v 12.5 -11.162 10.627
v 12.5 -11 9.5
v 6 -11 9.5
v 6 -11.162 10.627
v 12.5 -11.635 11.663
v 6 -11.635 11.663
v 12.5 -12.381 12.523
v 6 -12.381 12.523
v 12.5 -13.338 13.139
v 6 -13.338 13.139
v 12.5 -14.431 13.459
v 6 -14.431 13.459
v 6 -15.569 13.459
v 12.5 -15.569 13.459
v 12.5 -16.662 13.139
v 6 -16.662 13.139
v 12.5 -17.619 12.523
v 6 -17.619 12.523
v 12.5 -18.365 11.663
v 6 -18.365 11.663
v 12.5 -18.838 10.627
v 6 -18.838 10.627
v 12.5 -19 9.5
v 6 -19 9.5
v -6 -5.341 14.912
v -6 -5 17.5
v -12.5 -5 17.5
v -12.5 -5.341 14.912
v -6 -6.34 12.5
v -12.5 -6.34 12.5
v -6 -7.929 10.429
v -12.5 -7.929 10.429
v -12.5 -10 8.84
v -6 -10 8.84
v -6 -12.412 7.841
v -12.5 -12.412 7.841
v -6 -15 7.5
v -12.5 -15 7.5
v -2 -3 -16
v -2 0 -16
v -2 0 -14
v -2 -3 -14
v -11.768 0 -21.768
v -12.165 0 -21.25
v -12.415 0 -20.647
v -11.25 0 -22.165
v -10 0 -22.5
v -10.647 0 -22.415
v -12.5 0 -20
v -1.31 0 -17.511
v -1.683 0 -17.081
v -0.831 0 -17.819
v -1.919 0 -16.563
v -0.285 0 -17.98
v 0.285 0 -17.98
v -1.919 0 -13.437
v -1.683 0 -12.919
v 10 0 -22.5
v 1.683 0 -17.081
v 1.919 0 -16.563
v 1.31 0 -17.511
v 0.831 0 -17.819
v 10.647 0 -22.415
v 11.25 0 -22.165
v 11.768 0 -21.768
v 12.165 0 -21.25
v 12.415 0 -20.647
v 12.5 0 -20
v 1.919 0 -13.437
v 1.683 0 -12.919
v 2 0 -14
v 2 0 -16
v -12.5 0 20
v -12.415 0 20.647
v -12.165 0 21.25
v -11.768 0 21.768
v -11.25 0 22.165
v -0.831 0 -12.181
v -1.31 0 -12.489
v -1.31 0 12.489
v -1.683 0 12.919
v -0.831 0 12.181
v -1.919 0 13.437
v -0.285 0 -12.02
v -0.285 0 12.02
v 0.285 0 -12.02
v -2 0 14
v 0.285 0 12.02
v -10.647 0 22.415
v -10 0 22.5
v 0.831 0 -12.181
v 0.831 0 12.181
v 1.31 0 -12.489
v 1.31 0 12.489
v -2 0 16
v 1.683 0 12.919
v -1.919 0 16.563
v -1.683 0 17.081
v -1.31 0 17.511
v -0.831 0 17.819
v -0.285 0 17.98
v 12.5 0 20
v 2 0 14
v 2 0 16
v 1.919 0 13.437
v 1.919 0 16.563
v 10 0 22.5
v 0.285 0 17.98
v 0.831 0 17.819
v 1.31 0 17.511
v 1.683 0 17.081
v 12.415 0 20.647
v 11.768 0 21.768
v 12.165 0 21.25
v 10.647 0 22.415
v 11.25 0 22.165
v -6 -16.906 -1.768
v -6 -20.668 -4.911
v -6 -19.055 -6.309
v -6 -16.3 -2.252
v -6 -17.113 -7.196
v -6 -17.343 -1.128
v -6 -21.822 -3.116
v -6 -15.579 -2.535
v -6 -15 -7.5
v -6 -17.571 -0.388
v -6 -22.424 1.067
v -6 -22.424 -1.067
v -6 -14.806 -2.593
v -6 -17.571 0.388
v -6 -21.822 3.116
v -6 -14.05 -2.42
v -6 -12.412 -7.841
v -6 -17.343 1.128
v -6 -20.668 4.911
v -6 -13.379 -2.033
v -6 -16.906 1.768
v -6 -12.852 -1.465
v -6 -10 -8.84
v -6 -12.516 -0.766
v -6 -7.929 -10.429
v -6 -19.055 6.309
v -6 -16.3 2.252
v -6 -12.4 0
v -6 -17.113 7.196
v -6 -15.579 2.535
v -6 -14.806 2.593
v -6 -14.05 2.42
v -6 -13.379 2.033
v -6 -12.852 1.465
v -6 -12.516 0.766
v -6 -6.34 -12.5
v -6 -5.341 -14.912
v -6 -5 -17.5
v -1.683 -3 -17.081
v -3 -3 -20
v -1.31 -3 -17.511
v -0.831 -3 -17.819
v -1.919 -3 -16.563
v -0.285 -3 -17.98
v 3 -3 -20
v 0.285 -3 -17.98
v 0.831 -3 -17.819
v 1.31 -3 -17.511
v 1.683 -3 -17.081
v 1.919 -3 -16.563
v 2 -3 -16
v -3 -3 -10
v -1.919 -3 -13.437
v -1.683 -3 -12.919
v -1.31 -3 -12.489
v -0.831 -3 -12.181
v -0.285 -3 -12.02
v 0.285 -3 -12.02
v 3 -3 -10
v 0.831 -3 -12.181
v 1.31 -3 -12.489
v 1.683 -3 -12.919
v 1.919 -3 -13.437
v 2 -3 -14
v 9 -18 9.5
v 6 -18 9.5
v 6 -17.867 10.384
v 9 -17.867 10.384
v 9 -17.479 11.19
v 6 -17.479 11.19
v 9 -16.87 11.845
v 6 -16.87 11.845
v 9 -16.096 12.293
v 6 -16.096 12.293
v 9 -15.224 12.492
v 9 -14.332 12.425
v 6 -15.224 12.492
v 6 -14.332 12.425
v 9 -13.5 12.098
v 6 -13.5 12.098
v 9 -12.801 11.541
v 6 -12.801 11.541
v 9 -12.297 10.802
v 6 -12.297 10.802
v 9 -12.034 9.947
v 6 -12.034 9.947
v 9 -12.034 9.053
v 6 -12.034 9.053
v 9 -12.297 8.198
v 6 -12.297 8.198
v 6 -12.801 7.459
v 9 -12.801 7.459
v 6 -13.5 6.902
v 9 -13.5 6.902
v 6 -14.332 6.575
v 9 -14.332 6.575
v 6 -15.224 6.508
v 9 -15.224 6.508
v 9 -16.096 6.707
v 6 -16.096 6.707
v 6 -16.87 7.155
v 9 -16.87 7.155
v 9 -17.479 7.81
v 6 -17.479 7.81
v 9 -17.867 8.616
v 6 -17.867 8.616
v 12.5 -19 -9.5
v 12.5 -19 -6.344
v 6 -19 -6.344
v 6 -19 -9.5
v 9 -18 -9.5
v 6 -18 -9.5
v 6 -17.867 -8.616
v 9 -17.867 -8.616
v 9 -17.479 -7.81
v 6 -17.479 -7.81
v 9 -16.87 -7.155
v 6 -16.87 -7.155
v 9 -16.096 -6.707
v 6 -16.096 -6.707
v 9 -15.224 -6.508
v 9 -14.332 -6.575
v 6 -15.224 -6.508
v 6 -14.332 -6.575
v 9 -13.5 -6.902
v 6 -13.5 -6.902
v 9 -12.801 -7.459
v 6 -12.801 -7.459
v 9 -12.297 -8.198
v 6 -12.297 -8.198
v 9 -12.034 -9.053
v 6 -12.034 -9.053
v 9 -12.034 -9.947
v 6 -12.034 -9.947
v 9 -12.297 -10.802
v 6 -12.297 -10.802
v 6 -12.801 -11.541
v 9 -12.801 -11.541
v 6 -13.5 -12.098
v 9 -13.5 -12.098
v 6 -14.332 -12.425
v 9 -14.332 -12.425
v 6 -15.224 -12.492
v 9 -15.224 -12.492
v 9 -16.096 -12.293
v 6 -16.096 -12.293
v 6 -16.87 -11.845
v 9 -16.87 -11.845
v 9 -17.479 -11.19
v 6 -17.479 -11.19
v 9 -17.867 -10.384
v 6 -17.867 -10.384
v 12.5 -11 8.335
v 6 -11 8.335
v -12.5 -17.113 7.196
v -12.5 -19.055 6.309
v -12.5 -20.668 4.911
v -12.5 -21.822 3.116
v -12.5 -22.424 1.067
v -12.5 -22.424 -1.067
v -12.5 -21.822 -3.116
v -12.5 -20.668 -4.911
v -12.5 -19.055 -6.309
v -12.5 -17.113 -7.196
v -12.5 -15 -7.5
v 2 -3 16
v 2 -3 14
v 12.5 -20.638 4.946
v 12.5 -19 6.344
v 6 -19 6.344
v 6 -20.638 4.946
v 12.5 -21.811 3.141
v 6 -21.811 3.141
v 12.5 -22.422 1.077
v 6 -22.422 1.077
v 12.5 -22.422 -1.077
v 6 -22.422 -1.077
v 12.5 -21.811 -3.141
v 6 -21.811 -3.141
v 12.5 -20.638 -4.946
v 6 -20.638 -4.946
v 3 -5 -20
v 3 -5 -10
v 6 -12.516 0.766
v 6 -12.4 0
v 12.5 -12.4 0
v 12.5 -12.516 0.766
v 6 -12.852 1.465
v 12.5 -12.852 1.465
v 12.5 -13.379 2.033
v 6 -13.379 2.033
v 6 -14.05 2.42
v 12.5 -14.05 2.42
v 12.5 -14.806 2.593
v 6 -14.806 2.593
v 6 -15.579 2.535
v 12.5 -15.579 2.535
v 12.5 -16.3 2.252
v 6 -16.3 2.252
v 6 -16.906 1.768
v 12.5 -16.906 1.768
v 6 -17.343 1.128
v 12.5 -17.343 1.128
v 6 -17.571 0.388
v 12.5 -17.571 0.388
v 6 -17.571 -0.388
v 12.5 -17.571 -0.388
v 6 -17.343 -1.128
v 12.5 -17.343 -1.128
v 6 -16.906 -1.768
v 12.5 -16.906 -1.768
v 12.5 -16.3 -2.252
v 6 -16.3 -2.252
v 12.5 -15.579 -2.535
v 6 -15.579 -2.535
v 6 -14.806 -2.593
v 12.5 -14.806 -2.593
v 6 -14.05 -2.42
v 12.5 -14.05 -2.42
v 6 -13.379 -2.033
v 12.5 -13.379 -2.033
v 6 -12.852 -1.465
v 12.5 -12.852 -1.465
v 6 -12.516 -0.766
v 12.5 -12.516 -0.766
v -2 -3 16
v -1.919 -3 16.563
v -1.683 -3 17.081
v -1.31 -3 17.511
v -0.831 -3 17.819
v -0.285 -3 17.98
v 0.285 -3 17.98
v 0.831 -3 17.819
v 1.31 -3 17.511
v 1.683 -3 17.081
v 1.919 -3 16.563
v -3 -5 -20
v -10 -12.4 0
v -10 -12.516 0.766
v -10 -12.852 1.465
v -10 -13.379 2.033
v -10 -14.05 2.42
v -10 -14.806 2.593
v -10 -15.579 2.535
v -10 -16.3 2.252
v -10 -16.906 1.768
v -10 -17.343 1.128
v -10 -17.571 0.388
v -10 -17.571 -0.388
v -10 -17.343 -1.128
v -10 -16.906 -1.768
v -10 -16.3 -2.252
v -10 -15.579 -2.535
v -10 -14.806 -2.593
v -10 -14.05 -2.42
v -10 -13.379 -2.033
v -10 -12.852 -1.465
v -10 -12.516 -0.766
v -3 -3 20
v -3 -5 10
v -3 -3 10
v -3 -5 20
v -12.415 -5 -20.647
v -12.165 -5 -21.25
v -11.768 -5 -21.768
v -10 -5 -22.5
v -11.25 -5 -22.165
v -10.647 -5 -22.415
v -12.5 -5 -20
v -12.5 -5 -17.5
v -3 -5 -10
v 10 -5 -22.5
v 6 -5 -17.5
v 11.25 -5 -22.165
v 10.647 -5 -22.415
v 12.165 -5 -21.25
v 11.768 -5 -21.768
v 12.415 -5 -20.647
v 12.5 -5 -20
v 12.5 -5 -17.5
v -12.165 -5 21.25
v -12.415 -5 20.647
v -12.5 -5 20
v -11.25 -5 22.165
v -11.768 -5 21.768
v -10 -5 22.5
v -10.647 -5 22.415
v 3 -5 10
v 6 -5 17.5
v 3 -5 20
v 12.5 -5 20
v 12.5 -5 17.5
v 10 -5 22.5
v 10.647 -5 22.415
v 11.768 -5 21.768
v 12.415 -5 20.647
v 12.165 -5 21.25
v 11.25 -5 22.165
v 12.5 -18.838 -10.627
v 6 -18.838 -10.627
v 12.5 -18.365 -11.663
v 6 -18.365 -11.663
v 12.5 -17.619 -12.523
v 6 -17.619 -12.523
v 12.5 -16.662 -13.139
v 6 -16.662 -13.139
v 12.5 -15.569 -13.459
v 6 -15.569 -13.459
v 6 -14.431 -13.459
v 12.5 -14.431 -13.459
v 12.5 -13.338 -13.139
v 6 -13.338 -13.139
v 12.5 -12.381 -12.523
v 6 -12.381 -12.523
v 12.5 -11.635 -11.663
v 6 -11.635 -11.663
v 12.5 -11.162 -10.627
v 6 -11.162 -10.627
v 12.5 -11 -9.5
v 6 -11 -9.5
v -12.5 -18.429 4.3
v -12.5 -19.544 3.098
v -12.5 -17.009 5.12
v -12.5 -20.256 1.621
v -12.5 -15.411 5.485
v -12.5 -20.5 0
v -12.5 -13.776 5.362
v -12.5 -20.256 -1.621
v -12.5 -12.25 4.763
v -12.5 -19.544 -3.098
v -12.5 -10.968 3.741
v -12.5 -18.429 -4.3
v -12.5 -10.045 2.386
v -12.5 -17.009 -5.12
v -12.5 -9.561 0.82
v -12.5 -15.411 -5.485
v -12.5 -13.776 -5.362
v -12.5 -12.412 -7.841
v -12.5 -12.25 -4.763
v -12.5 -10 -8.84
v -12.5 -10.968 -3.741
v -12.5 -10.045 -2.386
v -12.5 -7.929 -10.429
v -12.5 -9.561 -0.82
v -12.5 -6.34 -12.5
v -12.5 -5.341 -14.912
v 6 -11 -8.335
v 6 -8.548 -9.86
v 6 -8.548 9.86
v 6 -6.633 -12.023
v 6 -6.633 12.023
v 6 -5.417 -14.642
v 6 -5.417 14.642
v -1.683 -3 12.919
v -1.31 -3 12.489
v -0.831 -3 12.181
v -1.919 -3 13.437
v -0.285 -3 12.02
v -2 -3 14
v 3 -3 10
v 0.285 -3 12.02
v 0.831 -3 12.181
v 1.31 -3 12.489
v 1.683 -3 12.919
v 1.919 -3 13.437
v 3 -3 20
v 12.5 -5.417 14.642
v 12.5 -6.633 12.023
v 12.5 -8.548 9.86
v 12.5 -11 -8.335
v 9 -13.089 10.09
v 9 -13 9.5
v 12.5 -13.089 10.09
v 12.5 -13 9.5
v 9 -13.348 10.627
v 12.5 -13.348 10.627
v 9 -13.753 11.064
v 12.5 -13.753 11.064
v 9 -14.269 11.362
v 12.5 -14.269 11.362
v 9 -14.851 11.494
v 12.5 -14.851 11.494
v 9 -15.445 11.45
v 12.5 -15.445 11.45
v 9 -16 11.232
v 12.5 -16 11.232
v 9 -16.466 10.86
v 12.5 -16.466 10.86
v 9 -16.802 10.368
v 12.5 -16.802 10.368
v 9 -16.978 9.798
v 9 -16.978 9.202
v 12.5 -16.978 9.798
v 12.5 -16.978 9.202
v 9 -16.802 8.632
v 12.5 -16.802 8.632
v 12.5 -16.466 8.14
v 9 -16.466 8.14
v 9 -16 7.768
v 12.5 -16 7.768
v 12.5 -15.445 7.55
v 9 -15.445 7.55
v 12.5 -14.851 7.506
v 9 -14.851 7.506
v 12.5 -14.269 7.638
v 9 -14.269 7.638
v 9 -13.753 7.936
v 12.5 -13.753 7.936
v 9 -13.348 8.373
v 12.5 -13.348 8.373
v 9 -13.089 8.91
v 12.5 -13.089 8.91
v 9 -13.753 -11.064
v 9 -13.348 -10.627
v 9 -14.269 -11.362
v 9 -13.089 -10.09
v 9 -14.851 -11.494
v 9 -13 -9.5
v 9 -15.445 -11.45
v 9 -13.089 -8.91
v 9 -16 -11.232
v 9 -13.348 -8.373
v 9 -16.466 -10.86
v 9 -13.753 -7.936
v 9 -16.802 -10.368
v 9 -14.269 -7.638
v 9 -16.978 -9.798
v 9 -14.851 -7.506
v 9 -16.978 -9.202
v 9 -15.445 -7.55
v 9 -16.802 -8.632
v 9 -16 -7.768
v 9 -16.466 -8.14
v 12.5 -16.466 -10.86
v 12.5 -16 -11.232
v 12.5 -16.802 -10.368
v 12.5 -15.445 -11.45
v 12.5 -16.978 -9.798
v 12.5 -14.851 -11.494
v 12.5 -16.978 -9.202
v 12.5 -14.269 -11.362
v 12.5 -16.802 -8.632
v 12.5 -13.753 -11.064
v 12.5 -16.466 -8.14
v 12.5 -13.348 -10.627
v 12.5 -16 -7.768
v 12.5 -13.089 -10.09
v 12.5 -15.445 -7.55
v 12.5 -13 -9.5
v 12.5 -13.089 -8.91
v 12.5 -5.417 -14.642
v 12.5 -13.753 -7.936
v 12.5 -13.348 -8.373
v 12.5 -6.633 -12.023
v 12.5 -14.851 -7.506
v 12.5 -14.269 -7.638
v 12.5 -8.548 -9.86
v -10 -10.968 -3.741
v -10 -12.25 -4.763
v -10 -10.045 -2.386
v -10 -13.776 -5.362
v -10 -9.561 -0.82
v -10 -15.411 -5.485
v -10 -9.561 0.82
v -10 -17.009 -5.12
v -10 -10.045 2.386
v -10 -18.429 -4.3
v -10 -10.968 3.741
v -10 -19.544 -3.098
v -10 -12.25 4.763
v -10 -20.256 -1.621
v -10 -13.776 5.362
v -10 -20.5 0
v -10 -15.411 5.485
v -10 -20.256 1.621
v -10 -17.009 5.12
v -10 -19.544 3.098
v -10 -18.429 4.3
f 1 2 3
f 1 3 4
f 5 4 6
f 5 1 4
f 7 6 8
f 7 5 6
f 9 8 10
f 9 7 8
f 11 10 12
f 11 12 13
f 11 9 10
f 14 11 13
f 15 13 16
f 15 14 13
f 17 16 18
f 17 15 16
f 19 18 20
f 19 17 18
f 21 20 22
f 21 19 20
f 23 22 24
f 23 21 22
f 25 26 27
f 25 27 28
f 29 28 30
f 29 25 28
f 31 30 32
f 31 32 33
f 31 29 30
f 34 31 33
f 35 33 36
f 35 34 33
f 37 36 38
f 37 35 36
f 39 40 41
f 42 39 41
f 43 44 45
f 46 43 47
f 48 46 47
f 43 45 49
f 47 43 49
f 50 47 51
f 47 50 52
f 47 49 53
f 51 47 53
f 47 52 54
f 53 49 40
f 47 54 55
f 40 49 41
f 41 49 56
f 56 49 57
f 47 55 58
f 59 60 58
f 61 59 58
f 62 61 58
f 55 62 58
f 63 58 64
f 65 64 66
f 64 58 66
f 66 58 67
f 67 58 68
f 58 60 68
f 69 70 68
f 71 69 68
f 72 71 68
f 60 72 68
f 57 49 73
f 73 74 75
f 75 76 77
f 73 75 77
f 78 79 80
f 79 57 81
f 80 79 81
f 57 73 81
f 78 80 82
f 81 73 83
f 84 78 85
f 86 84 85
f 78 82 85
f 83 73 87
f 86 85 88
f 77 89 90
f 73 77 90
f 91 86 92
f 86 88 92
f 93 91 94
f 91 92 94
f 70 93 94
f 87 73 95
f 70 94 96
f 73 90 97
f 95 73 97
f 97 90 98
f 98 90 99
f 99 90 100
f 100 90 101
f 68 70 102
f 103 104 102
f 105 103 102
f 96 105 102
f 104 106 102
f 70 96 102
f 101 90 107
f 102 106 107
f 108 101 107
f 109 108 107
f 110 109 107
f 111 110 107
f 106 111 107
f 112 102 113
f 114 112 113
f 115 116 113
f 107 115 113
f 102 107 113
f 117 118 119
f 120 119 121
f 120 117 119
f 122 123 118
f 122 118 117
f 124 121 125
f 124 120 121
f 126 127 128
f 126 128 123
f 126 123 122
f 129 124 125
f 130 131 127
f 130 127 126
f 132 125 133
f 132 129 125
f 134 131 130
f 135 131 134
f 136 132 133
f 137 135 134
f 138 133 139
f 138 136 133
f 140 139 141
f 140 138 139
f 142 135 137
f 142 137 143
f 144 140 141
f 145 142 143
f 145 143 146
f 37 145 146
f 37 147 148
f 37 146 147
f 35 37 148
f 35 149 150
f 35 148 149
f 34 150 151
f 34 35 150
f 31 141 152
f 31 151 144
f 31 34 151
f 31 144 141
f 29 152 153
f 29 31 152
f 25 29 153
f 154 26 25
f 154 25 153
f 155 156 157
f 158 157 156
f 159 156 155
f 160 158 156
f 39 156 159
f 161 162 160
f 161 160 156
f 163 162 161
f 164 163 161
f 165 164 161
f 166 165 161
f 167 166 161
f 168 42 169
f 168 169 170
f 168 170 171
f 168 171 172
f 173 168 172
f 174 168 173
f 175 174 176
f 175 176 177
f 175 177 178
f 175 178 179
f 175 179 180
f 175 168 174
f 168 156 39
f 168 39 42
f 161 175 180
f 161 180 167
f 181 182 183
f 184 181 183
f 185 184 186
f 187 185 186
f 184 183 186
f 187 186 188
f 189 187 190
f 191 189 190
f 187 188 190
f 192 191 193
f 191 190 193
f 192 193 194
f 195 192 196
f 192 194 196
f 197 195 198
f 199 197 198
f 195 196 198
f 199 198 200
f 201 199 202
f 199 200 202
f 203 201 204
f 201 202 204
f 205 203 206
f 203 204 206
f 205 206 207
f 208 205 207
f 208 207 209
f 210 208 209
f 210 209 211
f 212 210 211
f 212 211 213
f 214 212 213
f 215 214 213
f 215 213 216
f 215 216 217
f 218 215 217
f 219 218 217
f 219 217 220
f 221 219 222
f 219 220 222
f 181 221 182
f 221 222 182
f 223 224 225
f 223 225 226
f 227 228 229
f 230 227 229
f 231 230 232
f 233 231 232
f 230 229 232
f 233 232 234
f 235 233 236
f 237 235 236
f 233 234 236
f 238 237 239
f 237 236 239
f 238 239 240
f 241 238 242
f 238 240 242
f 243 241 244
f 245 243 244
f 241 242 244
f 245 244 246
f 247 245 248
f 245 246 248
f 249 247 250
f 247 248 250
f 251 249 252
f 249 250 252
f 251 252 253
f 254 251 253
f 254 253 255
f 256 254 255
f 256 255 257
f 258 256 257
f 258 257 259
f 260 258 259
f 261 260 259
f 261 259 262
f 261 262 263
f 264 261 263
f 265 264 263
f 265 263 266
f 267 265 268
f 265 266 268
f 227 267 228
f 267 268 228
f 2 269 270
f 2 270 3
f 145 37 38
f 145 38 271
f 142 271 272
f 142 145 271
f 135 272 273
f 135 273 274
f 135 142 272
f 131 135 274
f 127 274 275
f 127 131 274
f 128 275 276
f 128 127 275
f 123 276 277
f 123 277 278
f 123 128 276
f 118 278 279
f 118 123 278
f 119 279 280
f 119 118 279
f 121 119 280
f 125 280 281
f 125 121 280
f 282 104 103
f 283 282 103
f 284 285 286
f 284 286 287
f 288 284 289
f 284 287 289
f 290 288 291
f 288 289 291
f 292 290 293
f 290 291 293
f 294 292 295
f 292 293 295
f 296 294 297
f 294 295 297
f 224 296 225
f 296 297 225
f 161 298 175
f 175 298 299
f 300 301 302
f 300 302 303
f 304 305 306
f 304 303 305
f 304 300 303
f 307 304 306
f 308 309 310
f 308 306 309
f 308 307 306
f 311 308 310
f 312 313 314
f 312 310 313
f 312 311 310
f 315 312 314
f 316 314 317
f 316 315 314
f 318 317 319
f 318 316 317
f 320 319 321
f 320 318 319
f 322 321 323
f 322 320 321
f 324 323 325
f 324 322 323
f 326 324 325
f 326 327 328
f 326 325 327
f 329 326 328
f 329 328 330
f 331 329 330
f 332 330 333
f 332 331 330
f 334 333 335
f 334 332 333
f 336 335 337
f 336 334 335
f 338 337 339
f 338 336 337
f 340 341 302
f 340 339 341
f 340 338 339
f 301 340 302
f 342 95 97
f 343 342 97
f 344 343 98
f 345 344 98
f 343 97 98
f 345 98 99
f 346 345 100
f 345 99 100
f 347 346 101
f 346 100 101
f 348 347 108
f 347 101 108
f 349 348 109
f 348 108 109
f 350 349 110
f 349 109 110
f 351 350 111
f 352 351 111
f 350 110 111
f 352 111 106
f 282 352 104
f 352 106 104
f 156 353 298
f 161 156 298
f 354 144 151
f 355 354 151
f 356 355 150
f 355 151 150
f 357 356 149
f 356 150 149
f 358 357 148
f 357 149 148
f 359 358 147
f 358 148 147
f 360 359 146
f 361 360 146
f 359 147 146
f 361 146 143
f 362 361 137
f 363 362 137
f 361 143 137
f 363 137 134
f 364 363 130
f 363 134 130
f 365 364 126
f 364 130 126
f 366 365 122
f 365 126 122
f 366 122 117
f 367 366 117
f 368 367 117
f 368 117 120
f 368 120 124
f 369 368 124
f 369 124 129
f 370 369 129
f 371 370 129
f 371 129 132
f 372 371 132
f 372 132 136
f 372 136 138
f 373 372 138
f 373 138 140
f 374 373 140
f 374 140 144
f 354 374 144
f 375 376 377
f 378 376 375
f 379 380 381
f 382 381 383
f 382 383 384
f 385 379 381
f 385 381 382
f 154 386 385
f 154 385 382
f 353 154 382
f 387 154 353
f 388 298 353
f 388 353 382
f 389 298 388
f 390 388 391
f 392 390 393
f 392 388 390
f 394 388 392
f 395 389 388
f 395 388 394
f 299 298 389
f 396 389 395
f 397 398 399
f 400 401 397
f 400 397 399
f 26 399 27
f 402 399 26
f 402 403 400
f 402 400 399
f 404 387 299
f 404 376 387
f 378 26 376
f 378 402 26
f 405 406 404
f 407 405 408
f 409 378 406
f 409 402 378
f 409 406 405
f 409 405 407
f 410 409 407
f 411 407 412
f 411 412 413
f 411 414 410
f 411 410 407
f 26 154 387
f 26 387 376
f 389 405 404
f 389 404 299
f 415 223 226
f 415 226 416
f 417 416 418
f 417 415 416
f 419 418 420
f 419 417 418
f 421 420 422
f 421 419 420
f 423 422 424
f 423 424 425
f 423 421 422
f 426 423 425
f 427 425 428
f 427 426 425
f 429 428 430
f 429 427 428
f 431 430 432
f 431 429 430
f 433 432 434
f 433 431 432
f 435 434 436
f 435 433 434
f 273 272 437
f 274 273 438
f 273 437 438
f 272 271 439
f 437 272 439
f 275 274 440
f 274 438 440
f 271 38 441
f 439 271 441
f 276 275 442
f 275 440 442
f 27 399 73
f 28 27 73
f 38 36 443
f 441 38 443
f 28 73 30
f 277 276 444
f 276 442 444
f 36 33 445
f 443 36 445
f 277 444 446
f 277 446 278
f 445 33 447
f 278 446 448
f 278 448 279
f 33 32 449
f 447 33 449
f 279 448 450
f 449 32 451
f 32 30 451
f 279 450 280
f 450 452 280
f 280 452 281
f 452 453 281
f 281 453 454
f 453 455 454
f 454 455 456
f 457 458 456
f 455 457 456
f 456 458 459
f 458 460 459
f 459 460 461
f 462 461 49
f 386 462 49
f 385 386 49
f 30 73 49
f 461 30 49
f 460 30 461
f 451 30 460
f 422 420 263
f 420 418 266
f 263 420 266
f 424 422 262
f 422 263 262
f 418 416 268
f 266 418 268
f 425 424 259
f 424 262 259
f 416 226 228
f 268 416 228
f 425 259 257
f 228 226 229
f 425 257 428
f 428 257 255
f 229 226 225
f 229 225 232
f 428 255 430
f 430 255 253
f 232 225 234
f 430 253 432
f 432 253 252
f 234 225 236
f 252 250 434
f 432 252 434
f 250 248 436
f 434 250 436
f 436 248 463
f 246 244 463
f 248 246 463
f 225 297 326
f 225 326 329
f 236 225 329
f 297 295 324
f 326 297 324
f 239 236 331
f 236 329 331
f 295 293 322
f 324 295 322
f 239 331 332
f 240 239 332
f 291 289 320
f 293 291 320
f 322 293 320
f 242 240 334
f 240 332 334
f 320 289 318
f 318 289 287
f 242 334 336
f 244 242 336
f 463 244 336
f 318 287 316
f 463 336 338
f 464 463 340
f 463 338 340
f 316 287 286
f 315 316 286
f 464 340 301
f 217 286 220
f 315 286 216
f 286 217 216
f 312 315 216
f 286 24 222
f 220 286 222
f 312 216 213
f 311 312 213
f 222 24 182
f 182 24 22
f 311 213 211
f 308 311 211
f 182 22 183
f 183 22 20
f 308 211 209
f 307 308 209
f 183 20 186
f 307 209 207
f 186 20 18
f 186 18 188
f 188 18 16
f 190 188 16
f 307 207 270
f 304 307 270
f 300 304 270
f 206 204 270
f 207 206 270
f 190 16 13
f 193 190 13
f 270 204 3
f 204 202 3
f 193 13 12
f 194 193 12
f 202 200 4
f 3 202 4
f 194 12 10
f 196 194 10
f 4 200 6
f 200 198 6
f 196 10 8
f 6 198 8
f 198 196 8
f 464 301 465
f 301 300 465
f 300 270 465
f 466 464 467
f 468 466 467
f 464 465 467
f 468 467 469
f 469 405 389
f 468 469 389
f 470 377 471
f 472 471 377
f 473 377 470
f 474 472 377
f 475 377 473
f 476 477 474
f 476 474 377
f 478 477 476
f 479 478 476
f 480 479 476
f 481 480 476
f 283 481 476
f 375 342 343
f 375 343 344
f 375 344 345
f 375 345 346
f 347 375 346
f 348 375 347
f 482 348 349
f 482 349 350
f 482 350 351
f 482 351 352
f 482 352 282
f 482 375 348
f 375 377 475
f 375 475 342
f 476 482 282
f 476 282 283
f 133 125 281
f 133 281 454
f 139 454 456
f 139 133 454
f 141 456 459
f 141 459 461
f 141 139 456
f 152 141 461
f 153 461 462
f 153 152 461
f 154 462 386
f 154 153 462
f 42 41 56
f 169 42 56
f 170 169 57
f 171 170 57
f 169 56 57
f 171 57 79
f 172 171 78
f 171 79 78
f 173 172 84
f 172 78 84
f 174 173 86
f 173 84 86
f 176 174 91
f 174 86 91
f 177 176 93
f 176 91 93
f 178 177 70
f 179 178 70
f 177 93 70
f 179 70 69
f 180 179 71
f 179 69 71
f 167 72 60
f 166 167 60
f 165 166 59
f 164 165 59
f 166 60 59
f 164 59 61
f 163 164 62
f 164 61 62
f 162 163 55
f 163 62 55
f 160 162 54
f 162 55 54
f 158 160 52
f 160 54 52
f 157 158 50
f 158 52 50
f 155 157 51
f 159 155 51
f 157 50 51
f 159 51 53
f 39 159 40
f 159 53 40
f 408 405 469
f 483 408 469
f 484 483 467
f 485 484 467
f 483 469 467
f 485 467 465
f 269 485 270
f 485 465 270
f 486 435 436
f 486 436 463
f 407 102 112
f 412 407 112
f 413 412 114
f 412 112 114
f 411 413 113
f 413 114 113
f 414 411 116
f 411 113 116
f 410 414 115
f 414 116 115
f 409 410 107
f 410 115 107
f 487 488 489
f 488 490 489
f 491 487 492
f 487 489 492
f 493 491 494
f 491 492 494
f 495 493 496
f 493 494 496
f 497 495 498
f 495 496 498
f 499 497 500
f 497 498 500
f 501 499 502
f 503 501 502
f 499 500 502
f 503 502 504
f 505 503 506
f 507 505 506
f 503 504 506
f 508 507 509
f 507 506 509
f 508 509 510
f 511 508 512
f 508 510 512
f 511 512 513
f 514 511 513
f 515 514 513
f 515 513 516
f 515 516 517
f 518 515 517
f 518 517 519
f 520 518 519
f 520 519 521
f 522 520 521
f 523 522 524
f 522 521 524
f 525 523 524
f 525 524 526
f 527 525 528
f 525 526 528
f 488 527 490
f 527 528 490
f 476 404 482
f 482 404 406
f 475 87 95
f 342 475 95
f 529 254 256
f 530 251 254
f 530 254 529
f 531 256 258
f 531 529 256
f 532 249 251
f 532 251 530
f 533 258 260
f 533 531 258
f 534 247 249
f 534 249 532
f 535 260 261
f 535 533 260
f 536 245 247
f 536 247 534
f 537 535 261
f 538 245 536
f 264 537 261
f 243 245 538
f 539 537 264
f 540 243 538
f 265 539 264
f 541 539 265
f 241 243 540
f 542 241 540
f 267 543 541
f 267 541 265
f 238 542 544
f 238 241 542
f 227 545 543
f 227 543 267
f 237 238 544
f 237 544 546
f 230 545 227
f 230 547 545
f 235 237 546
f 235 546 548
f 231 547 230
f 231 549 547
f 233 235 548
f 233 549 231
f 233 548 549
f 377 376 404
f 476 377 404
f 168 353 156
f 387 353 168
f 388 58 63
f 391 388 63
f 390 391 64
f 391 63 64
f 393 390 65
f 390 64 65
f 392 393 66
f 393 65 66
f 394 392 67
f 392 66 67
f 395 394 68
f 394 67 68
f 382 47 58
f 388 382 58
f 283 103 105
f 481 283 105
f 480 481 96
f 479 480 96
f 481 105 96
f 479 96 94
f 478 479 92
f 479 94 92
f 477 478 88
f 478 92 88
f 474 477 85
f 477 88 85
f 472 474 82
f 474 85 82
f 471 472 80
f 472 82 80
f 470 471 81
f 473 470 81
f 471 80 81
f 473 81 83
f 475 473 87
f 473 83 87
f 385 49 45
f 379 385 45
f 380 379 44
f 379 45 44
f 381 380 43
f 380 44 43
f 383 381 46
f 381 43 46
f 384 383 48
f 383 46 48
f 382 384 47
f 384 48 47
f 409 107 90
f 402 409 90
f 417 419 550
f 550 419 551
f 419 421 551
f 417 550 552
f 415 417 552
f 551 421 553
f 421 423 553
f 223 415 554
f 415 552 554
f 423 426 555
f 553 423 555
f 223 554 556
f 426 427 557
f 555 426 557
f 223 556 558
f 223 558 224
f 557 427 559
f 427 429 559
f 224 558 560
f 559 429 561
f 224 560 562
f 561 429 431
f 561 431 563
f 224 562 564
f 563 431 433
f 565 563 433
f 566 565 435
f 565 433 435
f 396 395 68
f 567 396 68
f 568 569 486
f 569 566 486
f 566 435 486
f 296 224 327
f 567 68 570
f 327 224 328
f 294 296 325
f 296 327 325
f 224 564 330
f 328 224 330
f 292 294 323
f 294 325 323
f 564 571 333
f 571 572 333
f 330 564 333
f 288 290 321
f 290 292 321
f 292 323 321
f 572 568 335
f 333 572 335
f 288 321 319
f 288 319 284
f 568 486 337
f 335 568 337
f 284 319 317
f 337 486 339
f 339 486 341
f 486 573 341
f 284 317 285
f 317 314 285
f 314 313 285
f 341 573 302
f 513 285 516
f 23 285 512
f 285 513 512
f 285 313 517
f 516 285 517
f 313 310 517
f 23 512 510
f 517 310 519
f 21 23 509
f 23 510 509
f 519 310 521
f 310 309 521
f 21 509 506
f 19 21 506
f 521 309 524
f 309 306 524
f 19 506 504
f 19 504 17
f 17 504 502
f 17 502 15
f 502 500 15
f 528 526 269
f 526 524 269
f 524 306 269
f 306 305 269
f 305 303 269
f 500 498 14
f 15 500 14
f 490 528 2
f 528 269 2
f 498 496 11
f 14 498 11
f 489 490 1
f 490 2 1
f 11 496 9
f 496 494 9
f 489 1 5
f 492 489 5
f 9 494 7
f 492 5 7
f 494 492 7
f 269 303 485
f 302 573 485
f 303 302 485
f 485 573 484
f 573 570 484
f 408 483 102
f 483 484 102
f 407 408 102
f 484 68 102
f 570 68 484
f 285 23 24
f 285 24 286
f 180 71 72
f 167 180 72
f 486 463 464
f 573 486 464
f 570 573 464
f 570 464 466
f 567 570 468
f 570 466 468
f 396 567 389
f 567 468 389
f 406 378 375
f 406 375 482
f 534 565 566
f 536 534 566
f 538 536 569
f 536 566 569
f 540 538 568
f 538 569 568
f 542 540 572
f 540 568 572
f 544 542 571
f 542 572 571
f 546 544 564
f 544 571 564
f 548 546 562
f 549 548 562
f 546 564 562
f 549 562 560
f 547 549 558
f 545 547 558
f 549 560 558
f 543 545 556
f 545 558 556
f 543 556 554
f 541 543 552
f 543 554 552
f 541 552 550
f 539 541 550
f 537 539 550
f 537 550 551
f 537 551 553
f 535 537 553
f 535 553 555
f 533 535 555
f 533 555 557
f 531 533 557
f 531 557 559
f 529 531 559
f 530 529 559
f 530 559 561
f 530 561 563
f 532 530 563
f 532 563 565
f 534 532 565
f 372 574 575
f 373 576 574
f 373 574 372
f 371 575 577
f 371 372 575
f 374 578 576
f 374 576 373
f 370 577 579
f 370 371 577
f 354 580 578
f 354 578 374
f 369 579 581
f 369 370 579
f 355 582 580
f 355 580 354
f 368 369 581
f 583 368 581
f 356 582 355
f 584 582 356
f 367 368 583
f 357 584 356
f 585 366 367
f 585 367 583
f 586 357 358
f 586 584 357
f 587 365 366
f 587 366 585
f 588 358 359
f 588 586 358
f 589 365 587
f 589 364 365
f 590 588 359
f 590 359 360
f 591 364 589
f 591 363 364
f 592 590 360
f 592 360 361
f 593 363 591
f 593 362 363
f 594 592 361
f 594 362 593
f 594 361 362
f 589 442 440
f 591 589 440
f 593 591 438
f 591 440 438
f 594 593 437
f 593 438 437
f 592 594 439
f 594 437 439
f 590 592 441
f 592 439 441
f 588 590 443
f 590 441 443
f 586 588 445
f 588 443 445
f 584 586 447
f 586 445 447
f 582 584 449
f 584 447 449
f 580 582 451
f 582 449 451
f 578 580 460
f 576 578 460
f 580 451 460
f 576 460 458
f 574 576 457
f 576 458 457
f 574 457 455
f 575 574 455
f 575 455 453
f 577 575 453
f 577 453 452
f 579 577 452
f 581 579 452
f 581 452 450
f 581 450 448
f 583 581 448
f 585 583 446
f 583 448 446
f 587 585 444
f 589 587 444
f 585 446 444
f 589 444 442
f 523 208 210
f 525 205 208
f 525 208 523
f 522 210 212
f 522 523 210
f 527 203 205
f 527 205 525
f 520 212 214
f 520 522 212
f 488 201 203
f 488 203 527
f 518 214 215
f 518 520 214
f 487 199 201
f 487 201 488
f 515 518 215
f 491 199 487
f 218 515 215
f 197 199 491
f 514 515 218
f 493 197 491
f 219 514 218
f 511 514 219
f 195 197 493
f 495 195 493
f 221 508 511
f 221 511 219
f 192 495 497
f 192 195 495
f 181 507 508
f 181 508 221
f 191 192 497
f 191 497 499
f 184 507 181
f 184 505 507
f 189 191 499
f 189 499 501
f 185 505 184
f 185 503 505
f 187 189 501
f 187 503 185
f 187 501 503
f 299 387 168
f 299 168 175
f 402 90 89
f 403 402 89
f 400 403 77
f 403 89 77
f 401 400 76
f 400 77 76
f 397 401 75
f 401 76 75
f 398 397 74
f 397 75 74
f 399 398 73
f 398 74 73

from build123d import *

# Parameters (mm, degrees)
F1_DEPTH  = 5
F2_W      = 6
F2_H      = 10
F3_DEPTH  = 2
F5_START  = 6
F4_R      = 2.6
F5_DEPTH  = 6.5
F6_START  = -6
F6_DEPTH  = 6.5
F7_R      = 5.5
F8_DEPTH  = 2.5
F9_R      = 2
F10_DEPTH = 6.5
F11_R     = 3
F12_DEPTH = 3


with BuildPart() as f1:
    # F0 (on Front) → F1 (new body)
    with BuildSketch(Plane.XZ):
        with BuildLine():
            Line((10, 22.5), (-10, 22.5))
            ThreePointArc((-10, 22.5), (-11.767766953, 21.767766953), (-12.5, 20))
            Line((-12.5, 20), (-12.5, -20))
            ThreePointArc((-12.5, -20), (-11.767766953, -21.767766953), (-10, -22.5))
            Line((-10, -22.5), (10, -22.5))
            ThreePointArc((10, -22.5), (11.767766953, -21.767766953), (12.5, -20))
            Line((12.5, -20), (12.5, 20))
            ThreePointArc((12.5, 20), (11.767766953, 21.767766953), (10, 22.5))
        make_face()
        with BuildLine():
            ThreePointArc((-2, -14), (0, -12), (2, -14))
            Line((2, -14), (2, -16))
            ThreePointArc((2, -16), (0, -18), (-2, -16))
            Line((-2, -16), (-2, -14))
        make_face(mode=Mode.SUBTRACT)
        with BuildLine():
            ThreePointArc((2, 14), (0, 12), (-2, 14))
            Line((-2, 14), (-2, 16))
            ThreePointArc((-2, 16), (0, 18), (2, 16))
            Line((2, 16), (2, 14))
        make_face(mode=Mode.SUBTRACT)
    extrude(amount=F1_DEPTH)

    # F2 (on face) → F3 (cut)
    with BuildSketch(Plane.XZ.offset(5)):
        with Locations((0, 15)):
            Rectangle(F2_W, F2_H)
        with Locations((0, -15)):
            Rectangle(F2_W, F2_H)
    extrude(amount=-F3_DEPTH, mode=Mode.SUBTRACT)

    # F4 (on Right) → F5 (join)
    with BuildSketch(Plane.YZ.offset(F5_START)):
        with BuildLine():
            ThreePointArc((-5, 17.5), (-7.9289321881, 10.4289321881), (-15, 7.5))
            ThreePointArc((-15, 7.5), (-22.5, 0), (-15, -7.5))
            ThreePointArc((-15, -7.5), (-7.9289321881, -10.4289321881), (-5, -17.5))
            Line((-5, -17.5), (-5, 17.5))
        make_face()
        with Locations((-15, 0)):
            Circle(F4_R, mode=Mode.SUBTRACT)
    extrude(amount=F5_DEPTH)

    # F4 (on Right) → F6 (join)
    with BuildSketch(Plane.YZ.offset(F6_START)):
        with BuildLine():
            ThreePointArc((-5, 17.5), (-7.9289321881, 10.4289321881), (-15, 7.5))
            ThreePointArc((-15, 7.5), (-22.5, 0), (-15, -7.5))
            ThreePointArc((-15, -7.5), (-7.9289321881, -10.4289321881), (-5, -17.5))
            Line((-5, -17.5), (-5, 17.5))
        make_face()
        with Locations((-15, 0)):
            Circle(F4_R, mode=Mode.SUBTRACT)
    extrude(amount=-F6_DEPTH)

    # F7 (on face) → F8 (cut)
    with BuildSketch(Plane(origin=(-12.5, 0, 0), x_dir=(0, -1, 0), z_dir=(-1, 0, 0))):
        with Locations((15, 0)):
            Circle(F7_R)
    extrude(amount=-F8_DEPTH, mode=Mode.SUBTRACT)

    # F9 (on face) → F10 (join, through all)
    with BuildSketch(Plane.YZ.offset(12.5)):
        with BuildLine():
            Line((-11, 2.6), (-11, 9.5))
            ThreePointArc((-11, 9.5), (-15, 13.5), (-19, 9.5))
            Line((-19, 9.5), (-19, 2.6))
            Line((-19, 2.6), (-11, 2.6))
        make_face()
        with Locations((-15, 9.5)):
            Circle(F9_R, mode=Mode.SUBTRACT)
        with BuildLine():
            Line((-19, -2.6), (-19, -9.5))
            ThreePointArc((-19, -9.5), (-15, -13.5), (-11, -9.5))
            Line((-11, -9.5), (-11, -2.6))
            Line((-11, -2.6), (-19, -2.6))
        make_face()
        with Locations((-15, -9.5)):
            Circle(F9_R, mode=Mode.SUBTRACT)
    extrude(amount=-F10_DEPTH)

    # F11 (on face) → F12 (cut)
    with BuildSketch(Plane(origin=(6, 0, 0), x_dir=(0, -1, 0), z_dir=(-1, 0, 0))):
        with Locations((15, 9.5)):
            Circle(F11_R)
        with Locations((15, -9.5)):
            Circle(F11_R)
    extrude(amount=-F12_DEPTH, mode=Mode.SUBTRACT)


solid = f1.part
